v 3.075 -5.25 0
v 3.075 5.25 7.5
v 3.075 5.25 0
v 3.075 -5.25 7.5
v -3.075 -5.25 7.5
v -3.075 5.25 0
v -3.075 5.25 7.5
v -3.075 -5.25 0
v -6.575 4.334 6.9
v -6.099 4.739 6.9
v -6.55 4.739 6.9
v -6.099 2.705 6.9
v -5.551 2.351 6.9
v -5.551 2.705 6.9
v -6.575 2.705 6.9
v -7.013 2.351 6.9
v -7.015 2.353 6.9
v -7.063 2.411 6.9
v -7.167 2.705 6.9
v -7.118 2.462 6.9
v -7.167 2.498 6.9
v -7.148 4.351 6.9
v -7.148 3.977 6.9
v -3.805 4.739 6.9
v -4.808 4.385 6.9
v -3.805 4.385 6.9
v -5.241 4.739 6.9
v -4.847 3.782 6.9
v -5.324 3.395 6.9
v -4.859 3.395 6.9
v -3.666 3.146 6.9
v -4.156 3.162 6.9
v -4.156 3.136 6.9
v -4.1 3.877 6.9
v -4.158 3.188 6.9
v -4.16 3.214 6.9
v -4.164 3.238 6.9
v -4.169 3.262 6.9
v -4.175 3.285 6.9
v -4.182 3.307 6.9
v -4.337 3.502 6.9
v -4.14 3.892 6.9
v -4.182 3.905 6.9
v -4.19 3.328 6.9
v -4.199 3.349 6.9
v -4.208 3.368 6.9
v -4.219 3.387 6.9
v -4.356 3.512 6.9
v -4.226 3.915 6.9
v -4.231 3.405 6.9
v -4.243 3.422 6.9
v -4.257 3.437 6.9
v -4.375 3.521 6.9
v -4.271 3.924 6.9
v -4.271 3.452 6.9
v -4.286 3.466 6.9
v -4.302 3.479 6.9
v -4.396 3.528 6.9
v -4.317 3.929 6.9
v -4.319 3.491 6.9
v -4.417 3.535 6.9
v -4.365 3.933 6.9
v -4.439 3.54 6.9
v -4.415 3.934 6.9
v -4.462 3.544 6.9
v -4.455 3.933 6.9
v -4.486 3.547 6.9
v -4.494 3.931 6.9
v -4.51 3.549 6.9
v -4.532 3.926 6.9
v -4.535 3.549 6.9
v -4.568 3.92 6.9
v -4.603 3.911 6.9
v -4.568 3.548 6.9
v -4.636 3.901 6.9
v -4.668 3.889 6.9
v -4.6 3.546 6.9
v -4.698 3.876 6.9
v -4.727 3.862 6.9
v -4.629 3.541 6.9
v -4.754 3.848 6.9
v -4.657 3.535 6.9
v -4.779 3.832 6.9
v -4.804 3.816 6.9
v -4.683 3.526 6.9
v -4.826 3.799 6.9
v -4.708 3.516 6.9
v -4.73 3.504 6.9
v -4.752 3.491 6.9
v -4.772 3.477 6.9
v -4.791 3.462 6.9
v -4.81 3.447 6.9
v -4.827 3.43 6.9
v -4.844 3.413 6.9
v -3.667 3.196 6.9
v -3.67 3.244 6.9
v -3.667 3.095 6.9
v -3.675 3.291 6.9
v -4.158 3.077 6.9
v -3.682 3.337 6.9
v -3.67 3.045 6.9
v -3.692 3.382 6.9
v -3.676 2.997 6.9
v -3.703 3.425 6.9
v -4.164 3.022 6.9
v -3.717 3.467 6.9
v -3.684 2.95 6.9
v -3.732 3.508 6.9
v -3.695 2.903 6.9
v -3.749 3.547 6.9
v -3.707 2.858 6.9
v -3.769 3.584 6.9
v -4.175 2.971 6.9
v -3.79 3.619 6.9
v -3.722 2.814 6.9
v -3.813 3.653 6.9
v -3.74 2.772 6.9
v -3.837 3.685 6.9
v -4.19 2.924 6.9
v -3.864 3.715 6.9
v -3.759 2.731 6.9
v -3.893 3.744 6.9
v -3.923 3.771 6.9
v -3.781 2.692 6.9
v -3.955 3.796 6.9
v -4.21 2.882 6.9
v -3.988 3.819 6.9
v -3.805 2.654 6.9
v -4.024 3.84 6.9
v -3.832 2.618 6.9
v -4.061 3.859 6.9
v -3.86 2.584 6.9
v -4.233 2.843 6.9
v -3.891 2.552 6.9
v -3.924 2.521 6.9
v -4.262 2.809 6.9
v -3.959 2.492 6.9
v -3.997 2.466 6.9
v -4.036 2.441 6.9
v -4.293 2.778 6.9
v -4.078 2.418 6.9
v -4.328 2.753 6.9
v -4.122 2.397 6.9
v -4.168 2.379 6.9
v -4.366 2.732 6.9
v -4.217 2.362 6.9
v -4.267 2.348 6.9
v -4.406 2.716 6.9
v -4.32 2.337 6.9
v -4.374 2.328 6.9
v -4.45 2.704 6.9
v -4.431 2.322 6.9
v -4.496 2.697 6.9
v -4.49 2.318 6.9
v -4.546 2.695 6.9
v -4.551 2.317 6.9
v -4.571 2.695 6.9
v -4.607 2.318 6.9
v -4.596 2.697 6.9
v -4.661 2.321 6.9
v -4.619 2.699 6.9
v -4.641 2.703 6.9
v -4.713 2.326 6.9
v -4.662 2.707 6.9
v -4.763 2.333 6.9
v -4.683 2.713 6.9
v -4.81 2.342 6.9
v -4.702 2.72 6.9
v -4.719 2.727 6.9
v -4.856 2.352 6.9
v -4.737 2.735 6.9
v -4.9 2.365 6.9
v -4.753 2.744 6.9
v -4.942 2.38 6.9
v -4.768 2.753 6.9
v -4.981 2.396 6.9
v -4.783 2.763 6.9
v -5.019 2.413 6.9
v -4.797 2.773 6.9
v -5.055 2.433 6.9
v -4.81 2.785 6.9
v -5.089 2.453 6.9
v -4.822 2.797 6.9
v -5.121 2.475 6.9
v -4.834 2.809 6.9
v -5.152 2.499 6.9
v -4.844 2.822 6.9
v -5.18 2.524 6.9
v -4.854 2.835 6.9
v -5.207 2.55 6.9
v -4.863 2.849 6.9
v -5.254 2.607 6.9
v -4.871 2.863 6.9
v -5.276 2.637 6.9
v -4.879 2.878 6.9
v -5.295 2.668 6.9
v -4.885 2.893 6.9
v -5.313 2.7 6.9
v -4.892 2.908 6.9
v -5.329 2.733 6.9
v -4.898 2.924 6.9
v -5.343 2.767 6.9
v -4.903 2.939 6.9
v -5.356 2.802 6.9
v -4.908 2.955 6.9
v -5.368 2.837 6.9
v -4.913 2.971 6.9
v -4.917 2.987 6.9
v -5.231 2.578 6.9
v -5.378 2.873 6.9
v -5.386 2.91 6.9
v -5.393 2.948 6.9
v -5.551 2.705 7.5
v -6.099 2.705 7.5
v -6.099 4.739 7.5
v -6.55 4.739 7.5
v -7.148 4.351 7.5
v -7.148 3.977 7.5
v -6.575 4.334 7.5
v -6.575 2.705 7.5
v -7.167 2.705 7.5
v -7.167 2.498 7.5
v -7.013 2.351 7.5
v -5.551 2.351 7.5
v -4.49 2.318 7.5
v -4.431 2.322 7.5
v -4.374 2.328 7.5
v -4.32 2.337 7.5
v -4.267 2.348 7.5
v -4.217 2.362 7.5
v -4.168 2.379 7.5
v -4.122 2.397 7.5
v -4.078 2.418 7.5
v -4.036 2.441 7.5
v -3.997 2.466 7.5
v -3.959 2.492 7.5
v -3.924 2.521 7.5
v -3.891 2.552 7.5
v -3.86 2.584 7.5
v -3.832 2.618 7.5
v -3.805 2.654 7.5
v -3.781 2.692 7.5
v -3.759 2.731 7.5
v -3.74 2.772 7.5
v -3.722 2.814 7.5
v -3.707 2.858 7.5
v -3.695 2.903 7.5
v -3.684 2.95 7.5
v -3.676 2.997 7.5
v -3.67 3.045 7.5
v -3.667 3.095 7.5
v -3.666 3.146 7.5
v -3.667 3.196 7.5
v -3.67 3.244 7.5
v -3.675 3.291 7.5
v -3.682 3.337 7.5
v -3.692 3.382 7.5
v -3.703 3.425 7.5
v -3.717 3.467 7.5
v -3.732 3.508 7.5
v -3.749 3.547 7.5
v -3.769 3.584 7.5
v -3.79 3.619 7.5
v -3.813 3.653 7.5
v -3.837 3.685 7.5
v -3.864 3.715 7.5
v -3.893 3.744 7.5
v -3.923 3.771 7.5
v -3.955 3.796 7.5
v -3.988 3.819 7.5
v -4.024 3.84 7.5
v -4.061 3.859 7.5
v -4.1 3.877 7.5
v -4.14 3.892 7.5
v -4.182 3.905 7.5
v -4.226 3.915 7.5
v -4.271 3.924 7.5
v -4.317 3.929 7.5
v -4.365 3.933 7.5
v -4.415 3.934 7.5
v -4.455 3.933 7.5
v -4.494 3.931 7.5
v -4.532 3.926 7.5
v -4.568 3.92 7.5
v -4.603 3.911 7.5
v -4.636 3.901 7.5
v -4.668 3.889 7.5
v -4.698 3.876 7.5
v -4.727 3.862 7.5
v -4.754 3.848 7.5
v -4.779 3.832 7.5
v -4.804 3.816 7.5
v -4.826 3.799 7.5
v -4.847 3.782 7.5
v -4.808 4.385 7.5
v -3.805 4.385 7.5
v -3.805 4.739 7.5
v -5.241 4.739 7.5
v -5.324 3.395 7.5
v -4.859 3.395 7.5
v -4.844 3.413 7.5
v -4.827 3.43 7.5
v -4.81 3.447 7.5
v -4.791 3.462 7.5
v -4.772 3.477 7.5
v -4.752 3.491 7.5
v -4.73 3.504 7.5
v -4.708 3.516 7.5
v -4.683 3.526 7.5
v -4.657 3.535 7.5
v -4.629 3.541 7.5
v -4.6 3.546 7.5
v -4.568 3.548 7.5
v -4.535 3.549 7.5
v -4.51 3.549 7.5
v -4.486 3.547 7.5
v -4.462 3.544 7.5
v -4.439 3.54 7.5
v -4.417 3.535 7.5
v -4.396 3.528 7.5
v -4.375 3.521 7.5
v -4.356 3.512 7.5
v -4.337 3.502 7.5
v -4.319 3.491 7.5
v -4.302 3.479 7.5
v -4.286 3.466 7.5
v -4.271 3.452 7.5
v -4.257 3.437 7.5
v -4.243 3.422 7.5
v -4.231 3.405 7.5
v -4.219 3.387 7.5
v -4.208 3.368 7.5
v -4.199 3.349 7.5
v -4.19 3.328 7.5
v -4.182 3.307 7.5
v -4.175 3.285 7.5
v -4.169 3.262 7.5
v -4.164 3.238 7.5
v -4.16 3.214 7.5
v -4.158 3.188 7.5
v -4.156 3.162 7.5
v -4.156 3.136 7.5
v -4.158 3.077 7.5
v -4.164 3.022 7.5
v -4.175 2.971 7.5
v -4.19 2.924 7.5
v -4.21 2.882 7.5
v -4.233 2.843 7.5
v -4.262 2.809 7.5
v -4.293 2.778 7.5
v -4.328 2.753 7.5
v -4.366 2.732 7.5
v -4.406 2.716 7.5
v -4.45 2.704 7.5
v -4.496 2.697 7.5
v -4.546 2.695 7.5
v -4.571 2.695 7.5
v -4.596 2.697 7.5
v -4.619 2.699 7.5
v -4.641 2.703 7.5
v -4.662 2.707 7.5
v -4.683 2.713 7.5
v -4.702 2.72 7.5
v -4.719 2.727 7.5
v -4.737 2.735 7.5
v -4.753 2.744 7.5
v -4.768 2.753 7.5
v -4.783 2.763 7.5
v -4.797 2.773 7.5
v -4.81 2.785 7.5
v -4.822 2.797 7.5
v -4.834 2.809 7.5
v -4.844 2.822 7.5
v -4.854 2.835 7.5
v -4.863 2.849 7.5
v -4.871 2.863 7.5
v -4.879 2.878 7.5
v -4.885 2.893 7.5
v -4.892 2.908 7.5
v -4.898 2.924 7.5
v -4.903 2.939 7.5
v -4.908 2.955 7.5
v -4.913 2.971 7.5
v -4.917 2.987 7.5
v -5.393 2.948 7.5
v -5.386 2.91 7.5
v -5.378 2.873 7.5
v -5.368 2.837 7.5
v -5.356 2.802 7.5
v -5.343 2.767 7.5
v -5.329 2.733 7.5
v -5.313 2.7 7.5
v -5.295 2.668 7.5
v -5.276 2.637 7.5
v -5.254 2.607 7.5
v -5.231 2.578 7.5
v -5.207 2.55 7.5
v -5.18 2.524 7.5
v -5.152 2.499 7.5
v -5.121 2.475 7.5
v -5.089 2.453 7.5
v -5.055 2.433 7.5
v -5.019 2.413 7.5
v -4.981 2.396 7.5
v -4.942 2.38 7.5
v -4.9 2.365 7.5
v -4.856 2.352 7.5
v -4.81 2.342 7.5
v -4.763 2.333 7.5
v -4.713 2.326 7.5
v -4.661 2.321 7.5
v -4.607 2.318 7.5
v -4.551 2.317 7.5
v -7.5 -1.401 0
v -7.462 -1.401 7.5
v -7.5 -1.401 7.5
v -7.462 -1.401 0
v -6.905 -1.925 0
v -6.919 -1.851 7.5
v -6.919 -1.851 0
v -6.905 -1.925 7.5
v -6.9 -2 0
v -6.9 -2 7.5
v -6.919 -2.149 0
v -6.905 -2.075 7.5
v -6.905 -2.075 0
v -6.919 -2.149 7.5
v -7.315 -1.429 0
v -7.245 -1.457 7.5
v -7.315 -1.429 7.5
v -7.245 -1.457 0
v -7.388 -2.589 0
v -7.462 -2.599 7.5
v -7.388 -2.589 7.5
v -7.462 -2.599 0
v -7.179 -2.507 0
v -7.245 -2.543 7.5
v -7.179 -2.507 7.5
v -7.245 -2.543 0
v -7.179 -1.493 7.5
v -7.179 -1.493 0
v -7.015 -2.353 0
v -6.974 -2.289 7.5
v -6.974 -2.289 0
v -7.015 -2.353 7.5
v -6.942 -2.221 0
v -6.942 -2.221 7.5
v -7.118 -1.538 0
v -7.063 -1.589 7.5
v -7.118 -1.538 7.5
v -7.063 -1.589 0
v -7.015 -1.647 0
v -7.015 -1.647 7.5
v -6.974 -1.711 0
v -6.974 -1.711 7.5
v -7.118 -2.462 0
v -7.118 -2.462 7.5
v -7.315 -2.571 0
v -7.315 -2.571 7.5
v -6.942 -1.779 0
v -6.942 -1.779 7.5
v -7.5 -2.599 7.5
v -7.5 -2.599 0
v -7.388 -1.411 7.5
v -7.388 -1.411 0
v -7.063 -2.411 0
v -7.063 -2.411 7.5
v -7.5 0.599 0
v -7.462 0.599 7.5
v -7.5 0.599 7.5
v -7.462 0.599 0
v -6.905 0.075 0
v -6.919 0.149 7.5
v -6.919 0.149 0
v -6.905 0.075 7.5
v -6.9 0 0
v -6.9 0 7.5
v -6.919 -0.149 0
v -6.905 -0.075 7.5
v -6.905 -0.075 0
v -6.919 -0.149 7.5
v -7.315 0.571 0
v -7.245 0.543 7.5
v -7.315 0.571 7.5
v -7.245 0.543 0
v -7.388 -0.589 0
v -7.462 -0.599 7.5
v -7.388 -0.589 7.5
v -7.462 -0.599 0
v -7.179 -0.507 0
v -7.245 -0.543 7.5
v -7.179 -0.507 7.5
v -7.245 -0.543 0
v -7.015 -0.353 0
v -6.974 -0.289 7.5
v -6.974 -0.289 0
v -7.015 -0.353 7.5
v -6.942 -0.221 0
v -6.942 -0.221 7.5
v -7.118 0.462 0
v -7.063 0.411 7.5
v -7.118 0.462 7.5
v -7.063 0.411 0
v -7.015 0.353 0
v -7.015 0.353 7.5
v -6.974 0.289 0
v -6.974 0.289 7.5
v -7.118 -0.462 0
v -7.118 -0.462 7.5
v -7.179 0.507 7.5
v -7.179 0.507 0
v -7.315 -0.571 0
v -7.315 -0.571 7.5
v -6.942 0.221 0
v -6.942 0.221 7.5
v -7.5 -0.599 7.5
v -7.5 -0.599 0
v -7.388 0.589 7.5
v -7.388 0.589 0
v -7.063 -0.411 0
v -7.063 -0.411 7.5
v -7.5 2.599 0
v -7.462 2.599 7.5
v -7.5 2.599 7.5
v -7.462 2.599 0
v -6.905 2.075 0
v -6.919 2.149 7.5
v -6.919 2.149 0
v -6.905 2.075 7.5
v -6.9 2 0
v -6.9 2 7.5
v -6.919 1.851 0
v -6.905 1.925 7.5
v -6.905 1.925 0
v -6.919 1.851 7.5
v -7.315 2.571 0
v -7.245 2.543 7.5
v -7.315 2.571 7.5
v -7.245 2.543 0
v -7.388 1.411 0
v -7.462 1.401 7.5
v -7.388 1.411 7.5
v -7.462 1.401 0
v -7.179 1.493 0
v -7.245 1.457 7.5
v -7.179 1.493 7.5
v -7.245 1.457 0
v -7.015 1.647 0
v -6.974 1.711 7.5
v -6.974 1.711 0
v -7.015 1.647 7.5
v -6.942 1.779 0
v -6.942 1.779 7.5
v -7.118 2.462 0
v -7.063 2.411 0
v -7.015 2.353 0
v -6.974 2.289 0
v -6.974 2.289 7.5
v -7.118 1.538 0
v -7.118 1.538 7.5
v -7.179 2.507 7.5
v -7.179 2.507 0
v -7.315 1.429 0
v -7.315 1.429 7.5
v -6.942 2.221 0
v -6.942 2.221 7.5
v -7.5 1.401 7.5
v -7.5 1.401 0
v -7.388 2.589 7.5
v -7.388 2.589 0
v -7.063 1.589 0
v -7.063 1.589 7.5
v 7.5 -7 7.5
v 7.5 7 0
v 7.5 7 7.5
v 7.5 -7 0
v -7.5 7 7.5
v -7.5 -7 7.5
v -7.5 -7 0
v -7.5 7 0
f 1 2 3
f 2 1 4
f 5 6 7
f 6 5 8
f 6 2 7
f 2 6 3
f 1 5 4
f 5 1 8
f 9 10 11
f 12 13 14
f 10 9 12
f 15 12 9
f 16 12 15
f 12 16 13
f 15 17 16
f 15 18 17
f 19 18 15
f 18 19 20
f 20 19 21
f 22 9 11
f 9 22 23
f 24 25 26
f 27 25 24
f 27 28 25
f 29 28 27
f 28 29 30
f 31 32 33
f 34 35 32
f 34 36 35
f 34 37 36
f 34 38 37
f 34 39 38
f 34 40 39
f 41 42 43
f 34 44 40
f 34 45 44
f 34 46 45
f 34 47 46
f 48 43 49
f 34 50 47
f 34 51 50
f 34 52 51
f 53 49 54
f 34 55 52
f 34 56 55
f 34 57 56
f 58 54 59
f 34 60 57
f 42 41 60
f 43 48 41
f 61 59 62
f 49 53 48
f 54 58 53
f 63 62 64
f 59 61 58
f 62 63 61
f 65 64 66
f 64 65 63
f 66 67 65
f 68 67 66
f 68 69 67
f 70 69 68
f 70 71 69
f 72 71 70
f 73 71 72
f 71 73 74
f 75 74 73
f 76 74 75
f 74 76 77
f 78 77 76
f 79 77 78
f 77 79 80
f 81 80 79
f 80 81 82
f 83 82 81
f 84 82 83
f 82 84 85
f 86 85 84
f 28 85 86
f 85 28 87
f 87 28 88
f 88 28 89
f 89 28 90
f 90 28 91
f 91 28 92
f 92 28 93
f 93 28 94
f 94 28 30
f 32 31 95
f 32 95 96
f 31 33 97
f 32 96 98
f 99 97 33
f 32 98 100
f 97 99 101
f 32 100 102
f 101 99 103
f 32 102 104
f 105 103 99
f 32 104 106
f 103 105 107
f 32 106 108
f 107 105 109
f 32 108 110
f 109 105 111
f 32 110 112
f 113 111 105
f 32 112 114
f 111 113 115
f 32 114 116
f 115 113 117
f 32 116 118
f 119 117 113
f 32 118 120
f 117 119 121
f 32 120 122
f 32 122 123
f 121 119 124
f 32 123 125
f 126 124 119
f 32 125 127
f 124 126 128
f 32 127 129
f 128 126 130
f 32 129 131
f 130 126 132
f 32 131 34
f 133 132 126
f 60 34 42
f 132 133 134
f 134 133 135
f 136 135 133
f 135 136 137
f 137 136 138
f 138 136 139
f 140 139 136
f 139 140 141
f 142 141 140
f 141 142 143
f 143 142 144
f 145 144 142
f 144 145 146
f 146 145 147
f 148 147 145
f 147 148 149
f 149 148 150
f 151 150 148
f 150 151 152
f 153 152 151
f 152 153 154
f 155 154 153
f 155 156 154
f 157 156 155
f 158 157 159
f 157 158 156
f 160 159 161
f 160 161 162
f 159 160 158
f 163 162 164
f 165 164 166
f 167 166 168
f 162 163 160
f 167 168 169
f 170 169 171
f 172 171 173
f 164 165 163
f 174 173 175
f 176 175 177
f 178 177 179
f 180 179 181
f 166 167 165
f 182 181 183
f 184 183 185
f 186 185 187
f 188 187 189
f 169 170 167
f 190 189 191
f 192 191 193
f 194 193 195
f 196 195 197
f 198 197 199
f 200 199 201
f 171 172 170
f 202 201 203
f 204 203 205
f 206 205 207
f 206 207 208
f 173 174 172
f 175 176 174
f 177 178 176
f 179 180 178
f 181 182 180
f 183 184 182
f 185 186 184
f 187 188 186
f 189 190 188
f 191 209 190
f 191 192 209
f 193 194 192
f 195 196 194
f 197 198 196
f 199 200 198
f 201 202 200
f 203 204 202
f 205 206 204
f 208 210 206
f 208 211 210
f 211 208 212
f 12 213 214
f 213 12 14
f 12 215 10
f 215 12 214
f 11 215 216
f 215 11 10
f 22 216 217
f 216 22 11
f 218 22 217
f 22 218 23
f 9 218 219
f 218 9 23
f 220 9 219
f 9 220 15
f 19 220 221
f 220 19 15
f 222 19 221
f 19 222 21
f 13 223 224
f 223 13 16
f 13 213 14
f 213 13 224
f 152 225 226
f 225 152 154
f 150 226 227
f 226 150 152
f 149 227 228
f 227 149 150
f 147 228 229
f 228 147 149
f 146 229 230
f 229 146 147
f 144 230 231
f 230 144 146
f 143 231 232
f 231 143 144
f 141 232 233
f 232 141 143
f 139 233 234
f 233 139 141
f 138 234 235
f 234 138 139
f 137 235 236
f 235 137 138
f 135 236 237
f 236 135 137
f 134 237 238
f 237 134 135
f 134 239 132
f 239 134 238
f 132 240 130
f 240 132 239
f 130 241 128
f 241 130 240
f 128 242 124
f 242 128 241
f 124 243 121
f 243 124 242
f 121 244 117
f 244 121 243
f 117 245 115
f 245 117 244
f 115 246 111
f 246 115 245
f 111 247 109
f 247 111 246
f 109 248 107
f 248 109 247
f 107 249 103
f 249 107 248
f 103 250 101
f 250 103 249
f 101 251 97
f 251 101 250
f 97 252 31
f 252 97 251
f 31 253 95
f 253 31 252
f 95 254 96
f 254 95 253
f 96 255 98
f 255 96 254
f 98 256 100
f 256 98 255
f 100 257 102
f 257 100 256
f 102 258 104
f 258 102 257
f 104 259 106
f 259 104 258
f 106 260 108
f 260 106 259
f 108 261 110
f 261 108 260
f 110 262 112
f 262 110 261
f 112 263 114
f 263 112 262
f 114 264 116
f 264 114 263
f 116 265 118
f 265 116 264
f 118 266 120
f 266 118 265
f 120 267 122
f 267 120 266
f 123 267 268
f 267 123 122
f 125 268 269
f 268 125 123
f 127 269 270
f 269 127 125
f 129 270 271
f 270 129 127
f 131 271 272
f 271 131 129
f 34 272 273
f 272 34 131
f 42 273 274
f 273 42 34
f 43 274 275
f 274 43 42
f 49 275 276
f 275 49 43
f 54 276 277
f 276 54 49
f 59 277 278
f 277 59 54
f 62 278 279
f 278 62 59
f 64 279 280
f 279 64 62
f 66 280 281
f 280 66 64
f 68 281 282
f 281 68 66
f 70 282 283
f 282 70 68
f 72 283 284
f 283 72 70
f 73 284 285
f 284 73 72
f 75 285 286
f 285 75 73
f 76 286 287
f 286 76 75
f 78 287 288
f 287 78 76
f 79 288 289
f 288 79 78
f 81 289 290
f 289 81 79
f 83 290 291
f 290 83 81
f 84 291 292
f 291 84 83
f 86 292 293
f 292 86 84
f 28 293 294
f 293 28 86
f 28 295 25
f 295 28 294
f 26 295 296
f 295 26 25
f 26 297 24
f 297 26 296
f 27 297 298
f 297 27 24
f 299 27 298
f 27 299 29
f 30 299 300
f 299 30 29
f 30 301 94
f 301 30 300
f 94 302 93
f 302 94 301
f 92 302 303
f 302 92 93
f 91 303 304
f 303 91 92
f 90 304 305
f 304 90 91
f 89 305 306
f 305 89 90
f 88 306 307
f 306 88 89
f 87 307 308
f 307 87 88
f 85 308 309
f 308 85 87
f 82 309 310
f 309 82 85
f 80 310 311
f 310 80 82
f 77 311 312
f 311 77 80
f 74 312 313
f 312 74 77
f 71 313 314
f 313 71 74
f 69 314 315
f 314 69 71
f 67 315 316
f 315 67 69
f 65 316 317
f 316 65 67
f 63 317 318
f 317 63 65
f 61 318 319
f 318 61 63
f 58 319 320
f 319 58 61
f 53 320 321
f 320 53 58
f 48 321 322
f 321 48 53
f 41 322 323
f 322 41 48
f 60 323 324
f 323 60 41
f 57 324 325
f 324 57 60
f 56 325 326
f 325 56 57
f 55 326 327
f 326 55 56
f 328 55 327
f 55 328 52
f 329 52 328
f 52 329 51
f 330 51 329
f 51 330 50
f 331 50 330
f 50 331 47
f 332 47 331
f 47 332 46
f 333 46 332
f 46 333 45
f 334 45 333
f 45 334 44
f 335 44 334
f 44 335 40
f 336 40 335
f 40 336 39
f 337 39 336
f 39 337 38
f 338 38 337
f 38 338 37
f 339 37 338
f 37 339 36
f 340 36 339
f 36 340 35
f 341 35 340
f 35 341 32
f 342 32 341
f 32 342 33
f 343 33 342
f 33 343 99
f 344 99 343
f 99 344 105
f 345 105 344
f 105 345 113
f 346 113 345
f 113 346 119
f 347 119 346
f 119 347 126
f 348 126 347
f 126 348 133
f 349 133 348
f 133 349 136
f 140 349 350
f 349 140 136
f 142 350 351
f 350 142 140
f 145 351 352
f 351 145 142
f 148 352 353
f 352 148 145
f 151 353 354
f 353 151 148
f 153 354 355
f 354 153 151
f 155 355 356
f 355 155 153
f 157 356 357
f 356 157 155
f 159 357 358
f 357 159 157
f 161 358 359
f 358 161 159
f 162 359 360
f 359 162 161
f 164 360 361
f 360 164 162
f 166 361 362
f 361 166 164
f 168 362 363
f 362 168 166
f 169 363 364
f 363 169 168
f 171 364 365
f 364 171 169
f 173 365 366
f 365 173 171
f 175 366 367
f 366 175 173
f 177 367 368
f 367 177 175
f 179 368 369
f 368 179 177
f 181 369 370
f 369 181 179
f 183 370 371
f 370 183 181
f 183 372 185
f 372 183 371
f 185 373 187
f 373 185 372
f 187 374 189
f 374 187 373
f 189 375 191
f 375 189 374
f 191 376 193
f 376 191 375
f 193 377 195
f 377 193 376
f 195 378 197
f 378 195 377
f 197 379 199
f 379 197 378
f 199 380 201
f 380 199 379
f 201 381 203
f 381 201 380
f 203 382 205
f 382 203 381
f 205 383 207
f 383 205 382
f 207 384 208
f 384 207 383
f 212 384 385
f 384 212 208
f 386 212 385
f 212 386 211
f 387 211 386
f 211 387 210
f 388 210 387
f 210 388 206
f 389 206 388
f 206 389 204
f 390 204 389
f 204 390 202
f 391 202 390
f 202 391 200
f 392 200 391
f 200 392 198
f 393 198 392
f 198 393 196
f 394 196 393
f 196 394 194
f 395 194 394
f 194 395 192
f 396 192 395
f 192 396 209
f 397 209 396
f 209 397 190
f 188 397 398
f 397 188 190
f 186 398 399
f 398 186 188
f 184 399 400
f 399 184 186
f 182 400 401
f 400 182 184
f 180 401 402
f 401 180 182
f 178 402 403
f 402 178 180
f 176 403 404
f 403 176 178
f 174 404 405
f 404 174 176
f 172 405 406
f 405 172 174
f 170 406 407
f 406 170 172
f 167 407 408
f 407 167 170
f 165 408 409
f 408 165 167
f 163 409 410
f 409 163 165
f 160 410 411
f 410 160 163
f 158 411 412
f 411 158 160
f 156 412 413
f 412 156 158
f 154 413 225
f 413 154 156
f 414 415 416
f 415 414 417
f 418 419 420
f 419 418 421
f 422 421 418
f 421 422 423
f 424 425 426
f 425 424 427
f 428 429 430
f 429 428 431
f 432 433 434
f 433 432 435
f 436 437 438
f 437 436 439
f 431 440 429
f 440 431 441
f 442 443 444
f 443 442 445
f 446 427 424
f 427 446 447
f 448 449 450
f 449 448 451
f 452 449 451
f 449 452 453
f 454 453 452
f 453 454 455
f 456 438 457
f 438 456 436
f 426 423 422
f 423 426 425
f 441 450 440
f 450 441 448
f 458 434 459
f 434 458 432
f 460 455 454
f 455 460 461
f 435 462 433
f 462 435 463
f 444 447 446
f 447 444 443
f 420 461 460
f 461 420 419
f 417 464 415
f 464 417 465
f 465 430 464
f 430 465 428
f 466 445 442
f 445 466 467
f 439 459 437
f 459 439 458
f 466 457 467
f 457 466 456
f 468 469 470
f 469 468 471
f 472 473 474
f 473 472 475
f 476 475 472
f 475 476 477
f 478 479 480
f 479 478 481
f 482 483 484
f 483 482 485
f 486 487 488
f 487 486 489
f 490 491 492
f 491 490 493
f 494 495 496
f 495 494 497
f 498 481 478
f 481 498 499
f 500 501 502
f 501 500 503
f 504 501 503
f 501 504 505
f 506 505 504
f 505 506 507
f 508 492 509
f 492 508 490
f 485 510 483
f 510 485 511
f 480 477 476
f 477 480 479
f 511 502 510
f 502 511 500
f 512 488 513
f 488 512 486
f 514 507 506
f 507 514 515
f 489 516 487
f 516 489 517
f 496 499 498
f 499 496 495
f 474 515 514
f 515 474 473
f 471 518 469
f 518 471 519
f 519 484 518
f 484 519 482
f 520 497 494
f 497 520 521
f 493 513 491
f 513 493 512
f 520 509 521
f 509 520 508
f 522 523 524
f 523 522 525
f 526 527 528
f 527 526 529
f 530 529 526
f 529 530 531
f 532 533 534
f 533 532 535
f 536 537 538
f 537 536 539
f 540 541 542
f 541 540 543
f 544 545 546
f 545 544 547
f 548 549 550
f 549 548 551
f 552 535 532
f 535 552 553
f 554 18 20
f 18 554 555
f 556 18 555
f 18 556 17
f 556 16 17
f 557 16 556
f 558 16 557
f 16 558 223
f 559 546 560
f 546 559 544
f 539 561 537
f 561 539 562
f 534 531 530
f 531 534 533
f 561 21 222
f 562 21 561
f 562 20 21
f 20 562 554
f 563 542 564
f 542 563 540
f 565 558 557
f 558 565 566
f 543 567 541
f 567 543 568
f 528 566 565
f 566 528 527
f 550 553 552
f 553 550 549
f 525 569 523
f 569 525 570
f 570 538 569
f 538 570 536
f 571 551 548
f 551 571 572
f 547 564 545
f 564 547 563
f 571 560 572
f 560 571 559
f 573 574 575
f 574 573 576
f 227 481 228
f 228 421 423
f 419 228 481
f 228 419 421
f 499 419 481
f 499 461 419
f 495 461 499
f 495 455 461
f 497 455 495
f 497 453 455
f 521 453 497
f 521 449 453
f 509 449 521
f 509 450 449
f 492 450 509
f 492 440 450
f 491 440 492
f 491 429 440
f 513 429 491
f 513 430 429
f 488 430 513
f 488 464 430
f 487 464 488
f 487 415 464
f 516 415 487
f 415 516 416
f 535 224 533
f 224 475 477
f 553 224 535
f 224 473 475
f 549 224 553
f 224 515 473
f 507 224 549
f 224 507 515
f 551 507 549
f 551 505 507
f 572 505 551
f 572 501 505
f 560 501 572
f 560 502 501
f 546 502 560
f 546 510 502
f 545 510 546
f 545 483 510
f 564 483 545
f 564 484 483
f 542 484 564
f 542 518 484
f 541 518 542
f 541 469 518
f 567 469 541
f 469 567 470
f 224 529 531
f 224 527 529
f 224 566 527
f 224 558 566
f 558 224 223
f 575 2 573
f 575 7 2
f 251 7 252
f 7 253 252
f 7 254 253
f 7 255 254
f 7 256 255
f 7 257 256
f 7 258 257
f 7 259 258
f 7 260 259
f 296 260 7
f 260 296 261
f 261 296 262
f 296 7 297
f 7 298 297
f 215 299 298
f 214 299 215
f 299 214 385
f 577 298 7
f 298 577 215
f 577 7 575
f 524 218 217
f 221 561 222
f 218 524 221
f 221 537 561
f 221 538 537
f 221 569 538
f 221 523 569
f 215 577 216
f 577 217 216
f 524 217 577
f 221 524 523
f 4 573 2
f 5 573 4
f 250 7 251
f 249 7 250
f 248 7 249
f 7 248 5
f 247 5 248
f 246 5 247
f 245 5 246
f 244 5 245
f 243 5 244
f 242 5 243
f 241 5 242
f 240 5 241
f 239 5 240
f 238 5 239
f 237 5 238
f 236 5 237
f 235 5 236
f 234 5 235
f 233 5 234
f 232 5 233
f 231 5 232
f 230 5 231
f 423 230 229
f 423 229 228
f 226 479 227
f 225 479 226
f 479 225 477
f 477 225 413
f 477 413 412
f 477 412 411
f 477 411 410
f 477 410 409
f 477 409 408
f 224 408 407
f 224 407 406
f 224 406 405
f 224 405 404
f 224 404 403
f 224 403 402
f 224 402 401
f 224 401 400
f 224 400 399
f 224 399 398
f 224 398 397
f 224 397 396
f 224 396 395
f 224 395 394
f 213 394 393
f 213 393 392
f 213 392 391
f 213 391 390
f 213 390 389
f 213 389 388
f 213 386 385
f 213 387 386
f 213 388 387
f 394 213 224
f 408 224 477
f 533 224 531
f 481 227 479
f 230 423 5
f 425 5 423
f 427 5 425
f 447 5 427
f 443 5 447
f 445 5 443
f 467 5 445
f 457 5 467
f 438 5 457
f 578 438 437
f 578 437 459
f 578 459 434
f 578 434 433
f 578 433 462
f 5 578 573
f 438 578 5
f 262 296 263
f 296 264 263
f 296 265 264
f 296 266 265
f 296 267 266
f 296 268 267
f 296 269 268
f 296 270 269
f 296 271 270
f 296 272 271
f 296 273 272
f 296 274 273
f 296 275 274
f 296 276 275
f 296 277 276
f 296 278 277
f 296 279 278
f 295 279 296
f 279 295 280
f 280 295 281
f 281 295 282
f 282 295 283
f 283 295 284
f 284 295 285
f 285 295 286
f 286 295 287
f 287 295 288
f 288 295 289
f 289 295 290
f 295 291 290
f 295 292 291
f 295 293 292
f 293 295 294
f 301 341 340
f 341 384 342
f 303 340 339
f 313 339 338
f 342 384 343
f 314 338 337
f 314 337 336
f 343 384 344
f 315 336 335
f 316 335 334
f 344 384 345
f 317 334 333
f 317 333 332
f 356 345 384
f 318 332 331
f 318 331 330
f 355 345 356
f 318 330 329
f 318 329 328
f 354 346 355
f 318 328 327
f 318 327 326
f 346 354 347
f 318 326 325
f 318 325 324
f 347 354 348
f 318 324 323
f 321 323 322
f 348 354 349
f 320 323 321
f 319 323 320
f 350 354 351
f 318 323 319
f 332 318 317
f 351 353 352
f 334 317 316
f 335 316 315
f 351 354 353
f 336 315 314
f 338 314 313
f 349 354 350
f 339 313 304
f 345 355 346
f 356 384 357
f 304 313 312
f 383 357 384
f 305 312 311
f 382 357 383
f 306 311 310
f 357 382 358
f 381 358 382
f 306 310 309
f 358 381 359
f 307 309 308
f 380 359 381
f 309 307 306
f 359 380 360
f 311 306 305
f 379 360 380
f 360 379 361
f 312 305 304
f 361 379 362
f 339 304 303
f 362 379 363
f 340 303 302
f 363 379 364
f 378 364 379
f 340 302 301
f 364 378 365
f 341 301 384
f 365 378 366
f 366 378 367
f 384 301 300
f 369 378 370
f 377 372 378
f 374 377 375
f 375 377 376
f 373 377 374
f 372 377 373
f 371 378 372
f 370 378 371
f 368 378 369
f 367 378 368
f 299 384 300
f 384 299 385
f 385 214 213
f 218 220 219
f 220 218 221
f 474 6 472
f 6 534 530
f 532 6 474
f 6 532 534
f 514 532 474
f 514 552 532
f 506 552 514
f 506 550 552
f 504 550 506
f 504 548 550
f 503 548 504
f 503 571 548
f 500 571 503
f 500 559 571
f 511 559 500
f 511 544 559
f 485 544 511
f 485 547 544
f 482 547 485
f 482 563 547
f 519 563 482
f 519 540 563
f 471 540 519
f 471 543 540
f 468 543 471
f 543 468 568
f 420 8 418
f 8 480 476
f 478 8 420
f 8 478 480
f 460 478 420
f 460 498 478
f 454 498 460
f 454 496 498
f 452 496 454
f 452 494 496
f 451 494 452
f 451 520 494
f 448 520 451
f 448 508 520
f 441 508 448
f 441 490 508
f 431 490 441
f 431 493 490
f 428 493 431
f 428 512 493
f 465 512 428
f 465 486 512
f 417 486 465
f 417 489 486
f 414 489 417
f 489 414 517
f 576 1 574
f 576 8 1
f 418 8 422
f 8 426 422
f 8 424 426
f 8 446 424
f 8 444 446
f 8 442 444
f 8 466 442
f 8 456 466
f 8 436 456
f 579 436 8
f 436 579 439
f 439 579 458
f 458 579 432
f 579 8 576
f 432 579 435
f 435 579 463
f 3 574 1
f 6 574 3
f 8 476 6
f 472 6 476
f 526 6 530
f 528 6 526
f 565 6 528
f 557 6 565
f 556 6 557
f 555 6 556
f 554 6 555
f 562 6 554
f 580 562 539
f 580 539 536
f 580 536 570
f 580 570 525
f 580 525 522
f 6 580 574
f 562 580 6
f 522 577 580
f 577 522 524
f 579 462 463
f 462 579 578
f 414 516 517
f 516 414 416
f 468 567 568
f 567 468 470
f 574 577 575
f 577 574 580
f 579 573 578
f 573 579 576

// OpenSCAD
$fn = 50;

difference() {
	union() {
		translate(v = [0, -5, 0]) {
			rotate(a = [0, 0, 0]) {
				difference() {
					union() {
						translate(v = [-7.5, -2.0, 0]) {
							cube(size = [15.0, 14.0, 7.5]);
						}
					}
					union() {
						translate(v = [-3.075, -0.25, -0.1]) {
							cube(size = [6.15, 10.5, 7.7]);
						}
						translate(v = [-5.5, 8.5, 6.9]) {
							linear_extrude(height = 0.7) {
								text(font = "Arial:style=Bold", halign = "center", size = 2.5, text = "15", valign = "center");
							}
						}
						translate(v = [-7.5, 3, -0.1]) {
							cylinder(h = 7.7, r = 0.6);
						}
						translate(v = [-7.5, 5, -0.1]) {
							cylinder(h = 7.7, r = 0.6);
						}
						translate(v = [-7.5, 7, -0.1]) {
							cylinder(h = 7.7, r = 0.6);
						}
					}
				}
			}
		}
	}
	union();
}
